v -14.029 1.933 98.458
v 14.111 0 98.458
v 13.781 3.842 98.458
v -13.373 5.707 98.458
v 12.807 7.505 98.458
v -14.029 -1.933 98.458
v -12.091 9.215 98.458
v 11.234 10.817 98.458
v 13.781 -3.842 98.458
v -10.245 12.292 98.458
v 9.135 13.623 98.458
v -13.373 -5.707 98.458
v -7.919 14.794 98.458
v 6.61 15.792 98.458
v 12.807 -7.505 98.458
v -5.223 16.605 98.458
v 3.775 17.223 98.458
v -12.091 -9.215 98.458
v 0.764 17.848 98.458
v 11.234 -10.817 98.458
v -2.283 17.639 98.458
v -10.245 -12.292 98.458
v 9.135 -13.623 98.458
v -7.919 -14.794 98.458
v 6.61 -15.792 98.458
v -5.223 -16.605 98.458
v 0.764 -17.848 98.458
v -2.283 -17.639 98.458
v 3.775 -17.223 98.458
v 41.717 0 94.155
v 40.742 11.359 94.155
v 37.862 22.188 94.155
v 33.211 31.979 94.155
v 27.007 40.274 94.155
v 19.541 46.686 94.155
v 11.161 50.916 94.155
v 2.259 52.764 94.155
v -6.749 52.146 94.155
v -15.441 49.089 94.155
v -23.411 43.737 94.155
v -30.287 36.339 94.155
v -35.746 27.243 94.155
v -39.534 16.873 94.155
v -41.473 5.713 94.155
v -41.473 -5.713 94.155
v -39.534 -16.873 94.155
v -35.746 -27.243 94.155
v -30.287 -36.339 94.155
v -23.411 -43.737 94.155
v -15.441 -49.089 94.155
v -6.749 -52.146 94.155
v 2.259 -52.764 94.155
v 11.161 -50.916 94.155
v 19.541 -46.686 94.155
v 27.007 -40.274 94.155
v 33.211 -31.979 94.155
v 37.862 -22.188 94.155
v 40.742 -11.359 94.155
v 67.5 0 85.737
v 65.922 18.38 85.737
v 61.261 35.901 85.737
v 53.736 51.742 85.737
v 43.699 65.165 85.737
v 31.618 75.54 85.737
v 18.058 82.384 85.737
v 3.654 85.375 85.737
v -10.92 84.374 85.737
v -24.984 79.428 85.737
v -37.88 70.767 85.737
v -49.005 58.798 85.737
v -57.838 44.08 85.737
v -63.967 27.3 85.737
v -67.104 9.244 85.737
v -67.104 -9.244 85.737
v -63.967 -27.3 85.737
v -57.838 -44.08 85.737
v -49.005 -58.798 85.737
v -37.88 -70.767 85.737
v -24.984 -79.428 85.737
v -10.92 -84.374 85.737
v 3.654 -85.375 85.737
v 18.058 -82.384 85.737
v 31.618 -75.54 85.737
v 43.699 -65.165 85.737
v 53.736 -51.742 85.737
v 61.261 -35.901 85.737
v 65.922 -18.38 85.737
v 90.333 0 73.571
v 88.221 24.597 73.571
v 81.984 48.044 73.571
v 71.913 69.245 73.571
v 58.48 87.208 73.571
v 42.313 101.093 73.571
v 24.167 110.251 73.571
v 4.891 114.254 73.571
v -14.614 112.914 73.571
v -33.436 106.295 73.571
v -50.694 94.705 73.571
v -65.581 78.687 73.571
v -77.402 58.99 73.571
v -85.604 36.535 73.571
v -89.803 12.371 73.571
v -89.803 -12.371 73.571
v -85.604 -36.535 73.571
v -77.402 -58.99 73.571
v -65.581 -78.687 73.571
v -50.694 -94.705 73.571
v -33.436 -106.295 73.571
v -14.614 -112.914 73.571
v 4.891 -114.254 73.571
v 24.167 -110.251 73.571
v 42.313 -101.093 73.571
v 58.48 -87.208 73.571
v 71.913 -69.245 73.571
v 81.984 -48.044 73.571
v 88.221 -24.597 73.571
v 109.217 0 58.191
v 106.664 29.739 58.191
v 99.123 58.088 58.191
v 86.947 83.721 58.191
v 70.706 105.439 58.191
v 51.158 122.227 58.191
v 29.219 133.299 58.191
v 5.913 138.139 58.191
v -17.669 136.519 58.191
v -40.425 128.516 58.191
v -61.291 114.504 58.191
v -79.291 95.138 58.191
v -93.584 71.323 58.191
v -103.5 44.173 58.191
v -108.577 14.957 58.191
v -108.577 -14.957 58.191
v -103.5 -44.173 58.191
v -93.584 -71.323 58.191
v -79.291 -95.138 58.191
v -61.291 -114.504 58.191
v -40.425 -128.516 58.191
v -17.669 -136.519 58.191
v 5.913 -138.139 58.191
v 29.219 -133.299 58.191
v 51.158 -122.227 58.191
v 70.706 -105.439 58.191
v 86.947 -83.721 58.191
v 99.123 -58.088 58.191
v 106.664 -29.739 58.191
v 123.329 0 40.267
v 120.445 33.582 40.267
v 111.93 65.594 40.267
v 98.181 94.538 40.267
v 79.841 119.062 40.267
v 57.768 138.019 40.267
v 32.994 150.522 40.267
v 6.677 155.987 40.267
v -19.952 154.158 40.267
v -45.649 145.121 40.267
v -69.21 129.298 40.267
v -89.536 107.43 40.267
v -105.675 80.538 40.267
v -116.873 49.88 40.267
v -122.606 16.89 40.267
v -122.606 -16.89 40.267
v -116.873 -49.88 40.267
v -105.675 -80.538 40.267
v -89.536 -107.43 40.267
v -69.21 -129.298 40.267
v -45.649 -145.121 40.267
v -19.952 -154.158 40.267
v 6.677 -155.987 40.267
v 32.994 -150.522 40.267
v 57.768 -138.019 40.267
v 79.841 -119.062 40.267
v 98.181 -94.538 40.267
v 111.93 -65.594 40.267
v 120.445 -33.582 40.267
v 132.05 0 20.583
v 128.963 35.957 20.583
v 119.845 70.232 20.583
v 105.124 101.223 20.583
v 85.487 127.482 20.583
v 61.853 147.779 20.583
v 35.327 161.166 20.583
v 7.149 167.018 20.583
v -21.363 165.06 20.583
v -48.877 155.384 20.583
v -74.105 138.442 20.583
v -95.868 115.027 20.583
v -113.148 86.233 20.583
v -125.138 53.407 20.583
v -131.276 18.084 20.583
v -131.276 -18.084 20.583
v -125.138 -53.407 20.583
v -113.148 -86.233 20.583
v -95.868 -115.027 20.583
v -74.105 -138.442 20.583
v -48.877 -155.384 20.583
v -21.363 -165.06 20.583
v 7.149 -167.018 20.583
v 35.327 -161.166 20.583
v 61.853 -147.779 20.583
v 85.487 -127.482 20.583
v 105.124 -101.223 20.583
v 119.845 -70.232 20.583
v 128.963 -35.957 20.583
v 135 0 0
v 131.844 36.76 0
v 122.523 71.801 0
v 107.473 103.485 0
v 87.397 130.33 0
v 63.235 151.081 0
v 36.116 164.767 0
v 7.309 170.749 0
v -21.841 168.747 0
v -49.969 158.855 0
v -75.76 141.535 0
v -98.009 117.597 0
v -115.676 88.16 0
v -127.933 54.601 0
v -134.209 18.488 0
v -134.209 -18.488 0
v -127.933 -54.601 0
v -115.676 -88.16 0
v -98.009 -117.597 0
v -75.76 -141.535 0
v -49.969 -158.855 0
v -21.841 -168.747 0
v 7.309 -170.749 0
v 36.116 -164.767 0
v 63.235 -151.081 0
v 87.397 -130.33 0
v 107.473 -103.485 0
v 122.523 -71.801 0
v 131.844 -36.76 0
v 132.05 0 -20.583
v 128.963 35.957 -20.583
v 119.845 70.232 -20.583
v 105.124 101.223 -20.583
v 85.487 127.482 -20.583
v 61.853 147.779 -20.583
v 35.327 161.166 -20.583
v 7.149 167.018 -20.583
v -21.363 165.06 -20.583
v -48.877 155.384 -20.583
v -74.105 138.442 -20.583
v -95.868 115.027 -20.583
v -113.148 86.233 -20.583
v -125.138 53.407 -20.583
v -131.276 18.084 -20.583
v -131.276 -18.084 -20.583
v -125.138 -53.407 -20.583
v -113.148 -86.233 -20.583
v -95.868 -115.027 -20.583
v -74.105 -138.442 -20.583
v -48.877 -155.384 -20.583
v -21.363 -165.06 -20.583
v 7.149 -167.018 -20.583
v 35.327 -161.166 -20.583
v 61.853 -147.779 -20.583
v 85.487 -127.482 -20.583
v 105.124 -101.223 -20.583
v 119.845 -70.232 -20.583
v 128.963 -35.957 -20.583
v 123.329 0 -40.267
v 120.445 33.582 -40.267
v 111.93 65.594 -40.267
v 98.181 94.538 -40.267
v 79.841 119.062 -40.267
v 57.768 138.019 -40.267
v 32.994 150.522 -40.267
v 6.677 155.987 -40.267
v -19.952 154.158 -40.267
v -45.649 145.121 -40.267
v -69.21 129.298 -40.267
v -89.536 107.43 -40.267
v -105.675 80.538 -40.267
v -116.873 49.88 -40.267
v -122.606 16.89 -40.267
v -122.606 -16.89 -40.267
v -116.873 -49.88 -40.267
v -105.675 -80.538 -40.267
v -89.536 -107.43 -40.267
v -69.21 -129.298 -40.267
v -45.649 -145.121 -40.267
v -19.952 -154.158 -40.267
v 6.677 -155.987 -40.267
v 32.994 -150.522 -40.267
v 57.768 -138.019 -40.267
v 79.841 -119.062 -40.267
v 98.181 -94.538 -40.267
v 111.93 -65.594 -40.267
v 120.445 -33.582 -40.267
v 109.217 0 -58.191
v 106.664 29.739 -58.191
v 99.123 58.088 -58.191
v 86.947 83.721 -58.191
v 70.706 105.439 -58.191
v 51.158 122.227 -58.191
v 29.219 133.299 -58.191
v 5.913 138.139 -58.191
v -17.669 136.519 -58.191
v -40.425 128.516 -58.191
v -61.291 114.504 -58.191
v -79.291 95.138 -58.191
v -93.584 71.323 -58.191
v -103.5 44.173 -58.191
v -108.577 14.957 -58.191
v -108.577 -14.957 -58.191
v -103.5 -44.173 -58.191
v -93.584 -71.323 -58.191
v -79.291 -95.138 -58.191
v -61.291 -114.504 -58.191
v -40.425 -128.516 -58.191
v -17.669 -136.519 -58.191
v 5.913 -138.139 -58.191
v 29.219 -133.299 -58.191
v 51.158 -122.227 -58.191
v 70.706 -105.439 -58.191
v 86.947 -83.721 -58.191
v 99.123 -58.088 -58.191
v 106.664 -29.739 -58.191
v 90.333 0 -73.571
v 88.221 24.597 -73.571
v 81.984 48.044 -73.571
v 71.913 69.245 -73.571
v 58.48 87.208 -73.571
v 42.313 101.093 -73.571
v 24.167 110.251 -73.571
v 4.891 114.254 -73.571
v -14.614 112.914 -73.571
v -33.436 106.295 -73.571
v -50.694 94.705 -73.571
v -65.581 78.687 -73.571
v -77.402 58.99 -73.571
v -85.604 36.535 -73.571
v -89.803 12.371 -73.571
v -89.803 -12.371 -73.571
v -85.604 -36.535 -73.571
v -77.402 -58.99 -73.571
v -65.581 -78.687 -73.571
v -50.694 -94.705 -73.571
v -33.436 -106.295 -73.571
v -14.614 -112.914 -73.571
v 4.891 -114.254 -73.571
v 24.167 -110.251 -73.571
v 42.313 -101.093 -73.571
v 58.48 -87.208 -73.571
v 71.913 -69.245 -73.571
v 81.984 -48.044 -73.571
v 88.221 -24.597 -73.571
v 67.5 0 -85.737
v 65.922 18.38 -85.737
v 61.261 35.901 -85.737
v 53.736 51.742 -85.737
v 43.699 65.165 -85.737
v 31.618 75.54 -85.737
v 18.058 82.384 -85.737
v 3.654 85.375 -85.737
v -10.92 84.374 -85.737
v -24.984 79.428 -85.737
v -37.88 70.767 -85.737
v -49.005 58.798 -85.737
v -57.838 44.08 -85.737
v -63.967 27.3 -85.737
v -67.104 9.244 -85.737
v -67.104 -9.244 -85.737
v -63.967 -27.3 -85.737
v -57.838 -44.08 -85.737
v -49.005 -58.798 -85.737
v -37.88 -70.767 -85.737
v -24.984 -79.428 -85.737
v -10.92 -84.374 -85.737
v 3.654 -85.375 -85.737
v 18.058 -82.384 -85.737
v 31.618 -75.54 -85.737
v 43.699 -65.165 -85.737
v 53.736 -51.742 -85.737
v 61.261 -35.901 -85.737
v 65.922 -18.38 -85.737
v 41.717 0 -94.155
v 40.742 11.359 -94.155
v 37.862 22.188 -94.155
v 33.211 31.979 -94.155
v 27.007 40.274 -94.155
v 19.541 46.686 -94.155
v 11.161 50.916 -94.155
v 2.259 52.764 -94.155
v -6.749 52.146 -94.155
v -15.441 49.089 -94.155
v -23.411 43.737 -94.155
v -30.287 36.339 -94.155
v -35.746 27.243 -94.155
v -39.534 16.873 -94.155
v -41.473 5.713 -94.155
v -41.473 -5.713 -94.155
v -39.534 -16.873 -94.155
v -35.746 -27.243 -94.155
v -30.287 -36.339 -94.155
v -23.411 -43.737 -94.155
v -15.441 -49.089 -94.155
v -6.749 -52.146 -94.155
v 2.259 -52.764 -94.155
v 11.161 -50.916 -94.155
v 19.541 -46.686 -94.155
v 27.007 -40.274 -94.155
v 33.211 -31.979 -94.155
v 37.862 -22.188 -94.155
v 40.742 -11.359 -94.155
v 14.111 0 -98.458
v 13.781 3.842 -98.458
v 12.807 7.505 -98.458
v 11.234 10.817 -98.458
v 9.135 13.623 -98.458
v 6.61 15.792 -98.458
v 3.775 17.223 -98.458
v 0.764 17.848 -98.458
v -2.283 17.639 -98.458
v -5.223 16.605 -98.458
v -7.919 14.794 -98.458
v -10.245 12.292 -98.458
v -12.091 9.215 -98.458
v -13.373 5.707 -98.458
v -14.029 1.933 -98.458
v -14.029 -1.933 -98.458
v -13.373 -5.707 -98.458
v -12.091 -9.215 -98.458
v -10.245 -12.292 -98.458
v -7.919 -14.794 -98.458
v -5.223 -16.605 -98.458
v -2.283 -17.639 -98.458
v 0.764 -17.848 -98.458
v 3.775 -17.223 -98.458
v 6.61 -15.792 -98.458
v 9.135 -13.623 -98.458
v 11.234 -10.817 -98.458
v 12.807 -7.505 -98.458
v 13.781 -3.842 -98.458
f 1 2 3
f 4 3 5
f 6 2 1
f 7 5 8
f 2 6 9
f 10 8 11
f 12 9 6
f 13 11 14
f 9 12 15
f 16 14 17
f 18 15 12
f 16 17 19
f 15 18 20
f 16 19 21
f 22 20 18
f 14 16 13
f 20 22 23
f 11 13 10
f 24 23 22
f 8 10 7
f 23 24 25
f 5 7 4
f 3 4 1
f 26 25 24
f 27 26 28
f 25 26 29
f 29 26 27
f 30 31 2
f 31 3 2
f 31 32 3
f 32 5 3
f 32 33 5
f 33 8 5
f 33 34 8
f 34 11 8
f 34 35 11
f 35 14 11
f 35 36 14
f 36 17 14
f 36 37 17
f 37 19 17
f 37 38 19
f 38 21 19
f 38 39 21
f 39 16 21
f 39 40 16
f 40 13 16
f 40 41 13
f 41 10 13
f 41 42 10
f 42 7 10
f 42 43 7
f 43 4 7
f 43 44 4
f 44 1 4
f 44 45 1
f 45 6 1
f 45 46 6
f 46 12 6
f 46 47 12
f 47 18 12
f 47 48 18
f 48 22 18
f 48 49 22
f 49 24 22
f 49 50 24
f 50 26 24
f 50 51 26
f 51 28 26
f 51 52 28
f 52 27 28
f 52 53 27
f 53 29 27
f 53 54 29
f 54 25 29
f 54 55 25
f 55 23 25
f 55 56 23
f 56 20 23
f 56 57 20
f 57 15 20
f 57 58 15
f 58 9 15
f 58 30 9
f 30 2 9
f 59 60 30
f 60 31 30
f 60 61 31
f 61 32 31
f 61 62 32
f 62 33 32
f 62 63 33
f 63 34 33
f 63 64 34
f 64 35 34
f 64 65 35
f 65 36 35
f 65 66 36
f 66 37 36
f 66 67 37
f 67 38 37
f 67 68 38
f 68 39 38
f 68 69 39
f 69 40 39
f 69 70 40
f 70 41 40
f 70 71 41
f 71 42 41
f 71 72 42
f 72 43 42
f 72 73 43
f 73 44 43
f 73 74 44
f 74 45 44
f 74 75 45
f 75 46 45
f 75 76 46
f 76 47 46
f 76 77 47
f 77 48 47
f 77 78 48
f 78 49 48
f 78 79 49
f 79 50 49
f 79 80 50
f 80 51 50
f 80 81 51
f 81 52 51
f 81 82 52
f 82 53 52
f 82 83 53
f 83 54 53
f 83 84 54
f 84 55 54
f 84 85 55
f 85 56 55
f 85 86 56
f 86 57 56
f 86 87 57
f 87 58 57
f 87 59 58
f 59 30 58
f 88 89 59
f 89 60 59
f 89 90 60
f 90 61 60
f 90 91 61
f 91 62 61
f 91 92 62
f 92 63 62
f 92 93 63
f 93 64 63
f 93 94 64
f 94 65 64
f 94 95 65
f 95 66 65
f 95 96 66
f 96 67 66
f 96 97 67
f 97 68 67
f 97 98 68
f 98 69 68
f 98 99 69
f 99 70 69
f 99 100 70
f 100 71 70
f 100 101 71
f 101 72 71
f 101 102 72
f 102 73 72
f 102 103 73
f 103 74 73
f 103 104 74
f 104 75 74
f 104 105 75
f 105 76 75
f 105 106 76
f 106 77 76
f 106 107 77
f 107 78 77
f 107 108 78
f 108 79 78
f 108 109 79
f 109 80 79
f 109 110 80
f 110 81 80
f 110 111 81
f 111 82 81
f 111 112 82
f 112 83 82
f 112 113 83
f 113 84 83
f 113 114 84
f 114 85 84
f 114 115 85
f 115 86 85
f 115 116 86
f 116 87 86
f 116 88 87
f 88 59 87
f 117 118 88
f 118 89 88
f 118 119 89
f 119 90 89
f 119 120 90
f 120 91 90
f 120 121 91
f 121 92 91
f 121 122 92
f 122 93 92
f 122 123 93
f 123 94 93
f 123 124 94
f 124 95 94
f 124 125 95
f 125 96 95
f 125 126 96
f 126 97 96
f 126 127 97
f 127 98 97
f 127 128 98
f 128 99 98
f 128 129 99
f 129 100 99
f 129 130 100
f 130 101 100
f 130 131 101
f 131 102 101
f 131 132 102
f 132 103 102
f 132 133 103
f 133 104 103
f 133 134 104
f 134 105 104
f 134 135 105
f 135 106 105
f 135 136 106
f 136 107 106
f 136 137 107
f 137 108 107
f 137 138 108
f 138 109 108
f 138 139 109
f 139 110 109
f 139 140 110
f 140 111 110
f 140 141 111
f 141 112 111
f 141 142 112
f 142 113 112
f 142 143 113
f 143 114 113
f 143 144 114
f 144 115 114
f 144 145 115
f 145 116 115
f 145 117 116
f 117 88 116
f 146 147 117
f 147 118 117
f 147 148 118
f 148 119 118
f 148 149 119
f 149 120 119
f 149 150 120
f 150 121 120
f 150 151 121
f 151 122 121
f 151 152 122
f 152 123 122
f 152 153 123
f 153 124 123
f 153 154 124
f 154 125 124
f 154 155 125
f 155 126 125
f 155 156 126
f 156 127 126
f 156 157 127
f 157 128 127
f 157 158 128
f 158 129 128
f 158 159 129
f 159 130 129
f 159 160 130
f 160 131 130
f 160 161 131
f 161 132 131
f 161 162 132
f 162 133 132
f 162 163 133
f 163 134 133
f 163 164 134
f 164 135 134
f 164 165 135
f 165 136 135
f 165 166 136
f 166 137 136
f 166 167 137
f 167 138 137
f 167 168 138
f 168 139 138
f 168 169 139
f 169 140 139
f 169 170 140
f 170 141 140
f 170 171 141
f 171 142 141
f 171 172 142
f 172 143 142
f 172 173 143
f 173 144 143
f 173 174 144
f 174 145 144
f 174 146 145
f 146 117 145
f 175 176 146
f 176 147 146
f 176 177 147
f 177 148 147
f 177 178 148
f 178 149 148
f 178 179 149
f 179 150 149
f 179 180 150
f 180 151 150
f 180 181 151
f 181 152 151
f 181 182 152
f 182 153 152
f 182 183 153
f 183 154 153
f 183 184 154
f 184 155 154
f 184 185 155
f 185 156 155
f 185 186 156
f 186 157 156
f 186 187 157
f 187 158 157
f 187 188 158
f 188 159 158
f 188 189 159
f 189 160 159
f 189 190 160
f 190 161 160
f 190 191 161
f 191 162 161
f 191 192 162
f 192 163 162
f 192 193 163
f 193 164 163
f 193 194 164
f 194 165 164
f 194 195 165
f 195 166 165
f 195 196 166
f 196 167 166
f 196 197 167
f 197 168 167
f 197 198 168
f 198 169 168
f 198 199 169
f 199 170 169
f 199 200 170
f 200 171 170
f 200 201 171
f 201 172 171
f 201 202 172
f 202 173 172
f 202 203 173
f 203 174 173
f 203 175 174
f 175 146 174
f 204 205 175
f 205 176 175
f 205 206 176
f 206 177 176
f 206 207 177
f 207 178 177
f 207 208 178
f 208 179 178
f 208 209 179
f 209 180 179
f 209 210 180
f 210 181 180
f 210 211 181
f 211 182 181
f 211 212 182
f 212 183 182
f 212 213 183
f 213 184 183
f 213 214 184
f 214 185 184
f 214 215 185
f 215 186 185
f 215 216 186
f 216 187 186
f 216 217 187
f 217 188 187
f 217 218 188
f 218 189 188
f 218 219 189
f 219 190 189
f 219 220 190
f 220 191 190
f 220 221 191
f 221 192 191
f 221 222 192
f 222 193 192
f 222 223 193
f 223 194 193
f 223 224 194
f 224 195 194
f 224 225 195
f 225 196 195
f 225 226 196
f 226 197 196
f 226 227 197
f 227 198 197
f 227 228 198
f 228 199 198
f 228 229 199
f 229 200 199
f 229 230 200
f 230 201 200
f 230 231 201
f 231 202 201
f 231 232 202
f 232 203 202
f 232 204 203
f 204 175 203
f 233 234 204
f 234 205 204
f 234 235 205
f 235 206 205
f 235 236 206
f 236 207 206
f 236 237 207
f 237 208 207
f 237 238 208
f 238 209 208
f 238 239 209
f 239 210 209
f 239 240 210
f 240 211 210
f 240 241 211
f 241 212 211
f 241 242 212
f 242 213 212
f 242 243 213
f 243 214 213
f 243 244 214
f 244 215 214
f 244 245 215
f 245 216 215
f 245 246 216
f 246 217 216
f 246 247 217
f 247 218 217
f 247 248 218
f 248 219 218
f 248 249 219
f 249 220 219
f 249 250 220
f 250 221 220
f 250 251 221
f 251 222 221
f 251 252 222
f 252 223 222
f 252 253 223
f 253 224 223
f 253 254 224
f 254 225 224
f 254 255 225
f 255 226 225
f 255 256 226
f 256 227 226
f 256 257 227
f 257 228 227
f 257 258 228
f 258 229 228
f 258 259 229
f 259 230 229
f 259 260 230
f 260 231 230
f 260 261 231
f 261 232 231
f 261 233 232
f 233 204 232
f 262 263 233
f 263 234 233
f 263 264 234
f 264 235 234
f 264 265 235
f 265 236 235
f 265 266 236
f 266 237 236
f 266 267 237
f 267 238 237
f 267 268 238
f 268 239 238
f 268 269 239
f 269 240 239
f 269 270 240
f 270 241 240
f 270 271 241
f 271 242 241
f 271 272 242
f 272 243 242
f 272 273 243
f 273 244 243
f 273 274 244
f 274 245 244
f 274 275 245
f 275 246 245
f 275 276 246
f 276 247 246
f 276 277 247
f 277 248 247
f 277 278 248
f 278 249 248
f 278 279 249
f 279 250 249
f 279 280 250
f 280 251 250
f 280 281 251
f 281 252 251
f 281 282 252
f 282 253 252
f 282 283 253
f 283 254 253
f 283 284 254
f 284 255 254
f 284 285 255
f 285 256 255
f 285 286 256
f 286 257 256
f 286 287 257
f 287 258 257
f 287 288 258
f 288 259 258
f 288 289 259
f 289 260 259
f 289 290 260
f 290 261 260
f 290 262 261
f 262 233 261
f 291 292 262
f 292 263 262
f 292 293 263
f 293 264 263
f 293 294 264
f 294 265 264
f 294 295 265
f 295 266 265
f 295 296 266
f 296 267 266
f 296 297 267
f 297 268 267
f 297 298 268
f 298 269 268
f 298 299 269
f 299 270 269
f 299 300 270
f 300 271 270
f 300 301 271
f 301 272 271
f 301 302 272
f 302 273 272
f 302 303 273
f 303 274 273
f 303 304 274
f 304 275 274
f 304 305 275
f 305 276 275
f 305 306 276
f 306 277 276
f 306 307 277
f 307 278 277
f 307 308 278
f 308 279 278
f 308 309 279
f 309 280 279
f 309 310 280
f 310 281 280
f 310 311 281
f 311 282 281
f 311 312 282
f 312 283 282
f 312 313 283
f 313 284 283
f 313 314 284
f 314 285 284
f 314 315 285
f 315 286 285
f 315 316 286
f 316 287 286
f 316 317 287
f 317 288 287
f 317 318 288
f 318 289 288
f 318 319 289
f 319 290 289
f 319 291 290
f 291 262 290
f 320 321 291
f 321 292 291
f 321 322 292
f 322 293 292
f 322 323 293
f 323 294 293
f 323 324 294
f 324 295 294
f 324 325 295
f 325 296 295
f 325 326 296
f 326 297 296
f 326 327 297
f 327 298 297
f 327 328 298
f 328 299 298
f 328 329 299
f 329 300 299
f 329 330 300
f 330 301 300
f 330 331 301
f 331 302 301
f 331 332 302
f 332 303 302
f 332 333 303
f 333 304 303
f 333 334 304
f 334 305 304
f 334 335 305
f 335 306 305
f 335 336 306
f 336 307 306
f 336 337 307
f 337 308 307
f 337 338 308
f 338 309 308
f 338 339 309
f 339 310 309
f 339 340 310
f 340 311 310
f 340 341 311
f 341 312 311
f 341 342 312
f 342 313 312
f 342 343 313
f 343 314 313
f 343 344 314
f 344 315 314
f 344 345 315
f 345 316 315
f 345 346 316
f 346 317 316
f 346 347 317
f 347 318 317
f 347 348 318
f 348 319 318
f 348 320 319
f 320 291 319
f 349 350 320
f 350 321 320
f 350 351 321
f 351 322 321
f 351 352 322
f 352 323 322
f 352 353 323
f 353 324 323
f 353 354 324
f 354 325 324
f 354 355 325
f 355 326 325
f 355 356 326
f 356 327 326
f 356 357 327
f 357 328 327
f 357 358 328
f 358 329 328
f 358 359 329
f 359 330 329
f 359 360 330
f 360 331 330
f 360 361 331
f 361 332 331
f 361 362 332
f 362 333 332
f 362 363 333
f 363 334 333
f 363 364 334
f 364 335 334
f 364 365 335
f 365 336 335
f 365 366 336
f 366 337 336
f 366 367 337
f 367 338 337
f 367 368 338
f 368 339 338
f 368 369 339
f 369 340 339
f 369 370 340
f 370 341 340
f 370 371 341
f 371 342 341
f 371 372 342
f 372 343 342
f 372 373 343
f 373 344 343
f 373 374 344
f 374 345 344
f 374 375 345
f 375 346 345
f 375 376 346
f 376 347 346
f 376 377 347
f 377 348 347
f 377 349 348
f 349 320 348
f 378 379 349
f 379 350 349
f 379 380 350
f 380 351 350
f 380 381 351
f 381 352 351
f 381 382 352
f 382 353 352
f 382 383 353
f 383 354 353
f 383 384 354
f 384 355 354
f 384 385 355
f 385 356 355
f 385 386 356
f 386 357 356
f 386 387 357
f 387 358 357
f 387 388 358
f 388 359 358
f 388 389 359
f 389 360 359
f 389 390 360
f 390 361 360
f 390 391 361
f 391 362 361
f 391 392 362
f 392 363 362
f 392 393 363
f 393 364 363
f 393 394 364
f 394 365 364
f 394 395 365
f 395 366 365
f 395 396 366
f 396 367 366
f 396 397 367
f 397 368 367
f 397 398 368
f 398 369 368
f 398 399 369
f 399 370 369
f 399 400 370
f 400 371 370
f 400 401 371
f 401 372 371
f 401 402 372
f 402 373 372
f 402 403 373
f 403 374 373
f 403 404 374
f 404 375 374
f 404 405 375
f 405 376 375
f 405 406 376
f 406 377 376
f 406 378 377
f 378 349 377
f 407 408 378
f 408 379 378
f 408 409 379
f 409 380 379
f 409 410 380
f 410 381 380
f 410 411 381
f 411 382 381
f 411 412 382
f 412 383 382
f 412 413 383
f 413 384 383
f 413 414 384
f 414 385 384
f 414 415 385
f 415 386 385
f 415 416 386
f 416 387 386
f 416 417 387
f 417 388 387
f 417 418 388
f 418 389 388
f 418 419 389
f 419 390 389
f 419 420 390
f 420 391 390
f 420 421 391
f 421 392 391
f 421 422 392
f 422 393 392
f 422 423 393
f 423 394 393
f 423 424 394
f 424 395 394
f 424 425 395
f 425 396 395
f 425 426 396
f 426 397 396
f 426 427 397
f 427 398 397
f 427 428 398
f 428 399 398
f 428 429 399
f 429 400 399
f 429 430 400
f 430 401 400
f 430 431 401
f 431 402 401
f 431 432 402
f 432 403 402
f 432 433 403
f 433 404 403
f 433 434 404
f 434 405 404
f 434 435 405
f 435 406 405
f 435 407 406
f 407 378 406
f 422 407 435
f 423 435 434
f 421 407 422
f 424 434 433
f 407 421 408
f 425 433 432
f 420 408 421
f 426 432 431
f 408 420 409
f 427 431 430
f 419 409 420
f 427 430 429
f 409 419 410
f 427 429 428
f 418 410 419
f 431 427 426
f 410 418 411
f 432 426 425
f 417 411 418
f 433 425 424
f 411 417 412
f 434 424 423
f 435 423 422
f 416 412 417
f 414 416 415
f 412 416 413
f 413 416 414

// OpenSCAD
// Generated by SolidPython 1.0.1 on 2020-07-29 00:46:52


scale(v = [15, 19, 11]) {
	sphere(r = 9);
}
/***********************************************
*********      SolidPython code:      **********
************************************************
 
# import packages: SolidPython
from solid import *
from solid.utils import *
from itertools import chain, combinations, permutations


class Resize:

    def __init__(self, scad_file):
        self.scad_file = scad_file
        #self.scad_file = import_scad(scad_file)
        # cone/cylinder param:
        self.r1 = 0
        self.r2 = 0
        self.h = 0
        # rectangular prism param:
        self.w = 0
        self.l = 0
        # ellipse param:
        self.r = 0

    # import OpenScad code (file name corresponds to shape)


    # classify shape + parameters
    def assign(self, param1, param2, param3):
        if self.scad_file == 'cone.scad':
            self.r1 = param1
            self.r2 = param2
            self.h = param3
        elif self.scad_file == 'cylinder.scad':
            self.r1 = param1
            self.r2 = param2
            self.h = param3
        elif self.scad_file == 'rectangularPrism.scad':
            self.h = param1
            self.l = param2
            self.w = param3
        else:
            self.r = param1
            self.h = param2

    # resize parameters
    def iterate(self):
        x = range(3, 20, 2)
        i = 1
        if self.scad_file == 'cone.scad':
            tempList = list(permutations(x, 2))
            for temp in tempList:
                param1 = temp[0]
                param2 = temp[1]
                filepath = 'produced_scad_files/' + 'cone' + str(param1) + '_' + str(param2) + '_' + '.scad'
                scad_render_to_file(cylinder(h=param1, r1=param2, r2=0), filepath)

        elif self.scad_file == 'cylinder.scad':
            tempList = list(permutations(x, 3))
            for temp in tempList:
                param1 = temp[0]
                param2 = temp[1]
                filepath = 'produced_scad_files/' + 'cylinder' + str(param1) + '_' + str(param2) + '_' + '.scad'
                scad_render_to_file(cylinder(h=param1, r1=param2, r2=param2), filepath)

        elif self.scad_file == 'rectangularPrism.scad':
            tempList = list(permutations(x, 3))
            for temp in tempList:
                param1 = temp[0]
                param2 = temp[1]
                param3 = temp[2]
                filepath = 'produced_scad_files/' + 'rectangularPrism' + str(param1) + '_' + str(param2) + '_' + str(
                    param3) + '.scad'
                scad_render_to_file(cube(size=(param1, param2, param3)), filepath)

        elif self.scad_file == 'ellipse.scad':
            tempList = list(permutations(x, 4))
            for temp in tempList:
                param1 = temp[0]
                param2 = temp[1]
                param3 = temp[2]
                param4 = temp[3]
                filepath = 'produced_scad_files/' + 'ellipse' + str(param1) + '_' + str(param2) + '_' + str(param3) + '_' + str(param4) + '.scad'
                scad_render_to_file(scale([param1, param2, param3])(sphere(r=param4)), filepath)

    def render_to_scadfile(self):
        scad_render_to_file(scad, 'example.scad') 
 
************************************************/
